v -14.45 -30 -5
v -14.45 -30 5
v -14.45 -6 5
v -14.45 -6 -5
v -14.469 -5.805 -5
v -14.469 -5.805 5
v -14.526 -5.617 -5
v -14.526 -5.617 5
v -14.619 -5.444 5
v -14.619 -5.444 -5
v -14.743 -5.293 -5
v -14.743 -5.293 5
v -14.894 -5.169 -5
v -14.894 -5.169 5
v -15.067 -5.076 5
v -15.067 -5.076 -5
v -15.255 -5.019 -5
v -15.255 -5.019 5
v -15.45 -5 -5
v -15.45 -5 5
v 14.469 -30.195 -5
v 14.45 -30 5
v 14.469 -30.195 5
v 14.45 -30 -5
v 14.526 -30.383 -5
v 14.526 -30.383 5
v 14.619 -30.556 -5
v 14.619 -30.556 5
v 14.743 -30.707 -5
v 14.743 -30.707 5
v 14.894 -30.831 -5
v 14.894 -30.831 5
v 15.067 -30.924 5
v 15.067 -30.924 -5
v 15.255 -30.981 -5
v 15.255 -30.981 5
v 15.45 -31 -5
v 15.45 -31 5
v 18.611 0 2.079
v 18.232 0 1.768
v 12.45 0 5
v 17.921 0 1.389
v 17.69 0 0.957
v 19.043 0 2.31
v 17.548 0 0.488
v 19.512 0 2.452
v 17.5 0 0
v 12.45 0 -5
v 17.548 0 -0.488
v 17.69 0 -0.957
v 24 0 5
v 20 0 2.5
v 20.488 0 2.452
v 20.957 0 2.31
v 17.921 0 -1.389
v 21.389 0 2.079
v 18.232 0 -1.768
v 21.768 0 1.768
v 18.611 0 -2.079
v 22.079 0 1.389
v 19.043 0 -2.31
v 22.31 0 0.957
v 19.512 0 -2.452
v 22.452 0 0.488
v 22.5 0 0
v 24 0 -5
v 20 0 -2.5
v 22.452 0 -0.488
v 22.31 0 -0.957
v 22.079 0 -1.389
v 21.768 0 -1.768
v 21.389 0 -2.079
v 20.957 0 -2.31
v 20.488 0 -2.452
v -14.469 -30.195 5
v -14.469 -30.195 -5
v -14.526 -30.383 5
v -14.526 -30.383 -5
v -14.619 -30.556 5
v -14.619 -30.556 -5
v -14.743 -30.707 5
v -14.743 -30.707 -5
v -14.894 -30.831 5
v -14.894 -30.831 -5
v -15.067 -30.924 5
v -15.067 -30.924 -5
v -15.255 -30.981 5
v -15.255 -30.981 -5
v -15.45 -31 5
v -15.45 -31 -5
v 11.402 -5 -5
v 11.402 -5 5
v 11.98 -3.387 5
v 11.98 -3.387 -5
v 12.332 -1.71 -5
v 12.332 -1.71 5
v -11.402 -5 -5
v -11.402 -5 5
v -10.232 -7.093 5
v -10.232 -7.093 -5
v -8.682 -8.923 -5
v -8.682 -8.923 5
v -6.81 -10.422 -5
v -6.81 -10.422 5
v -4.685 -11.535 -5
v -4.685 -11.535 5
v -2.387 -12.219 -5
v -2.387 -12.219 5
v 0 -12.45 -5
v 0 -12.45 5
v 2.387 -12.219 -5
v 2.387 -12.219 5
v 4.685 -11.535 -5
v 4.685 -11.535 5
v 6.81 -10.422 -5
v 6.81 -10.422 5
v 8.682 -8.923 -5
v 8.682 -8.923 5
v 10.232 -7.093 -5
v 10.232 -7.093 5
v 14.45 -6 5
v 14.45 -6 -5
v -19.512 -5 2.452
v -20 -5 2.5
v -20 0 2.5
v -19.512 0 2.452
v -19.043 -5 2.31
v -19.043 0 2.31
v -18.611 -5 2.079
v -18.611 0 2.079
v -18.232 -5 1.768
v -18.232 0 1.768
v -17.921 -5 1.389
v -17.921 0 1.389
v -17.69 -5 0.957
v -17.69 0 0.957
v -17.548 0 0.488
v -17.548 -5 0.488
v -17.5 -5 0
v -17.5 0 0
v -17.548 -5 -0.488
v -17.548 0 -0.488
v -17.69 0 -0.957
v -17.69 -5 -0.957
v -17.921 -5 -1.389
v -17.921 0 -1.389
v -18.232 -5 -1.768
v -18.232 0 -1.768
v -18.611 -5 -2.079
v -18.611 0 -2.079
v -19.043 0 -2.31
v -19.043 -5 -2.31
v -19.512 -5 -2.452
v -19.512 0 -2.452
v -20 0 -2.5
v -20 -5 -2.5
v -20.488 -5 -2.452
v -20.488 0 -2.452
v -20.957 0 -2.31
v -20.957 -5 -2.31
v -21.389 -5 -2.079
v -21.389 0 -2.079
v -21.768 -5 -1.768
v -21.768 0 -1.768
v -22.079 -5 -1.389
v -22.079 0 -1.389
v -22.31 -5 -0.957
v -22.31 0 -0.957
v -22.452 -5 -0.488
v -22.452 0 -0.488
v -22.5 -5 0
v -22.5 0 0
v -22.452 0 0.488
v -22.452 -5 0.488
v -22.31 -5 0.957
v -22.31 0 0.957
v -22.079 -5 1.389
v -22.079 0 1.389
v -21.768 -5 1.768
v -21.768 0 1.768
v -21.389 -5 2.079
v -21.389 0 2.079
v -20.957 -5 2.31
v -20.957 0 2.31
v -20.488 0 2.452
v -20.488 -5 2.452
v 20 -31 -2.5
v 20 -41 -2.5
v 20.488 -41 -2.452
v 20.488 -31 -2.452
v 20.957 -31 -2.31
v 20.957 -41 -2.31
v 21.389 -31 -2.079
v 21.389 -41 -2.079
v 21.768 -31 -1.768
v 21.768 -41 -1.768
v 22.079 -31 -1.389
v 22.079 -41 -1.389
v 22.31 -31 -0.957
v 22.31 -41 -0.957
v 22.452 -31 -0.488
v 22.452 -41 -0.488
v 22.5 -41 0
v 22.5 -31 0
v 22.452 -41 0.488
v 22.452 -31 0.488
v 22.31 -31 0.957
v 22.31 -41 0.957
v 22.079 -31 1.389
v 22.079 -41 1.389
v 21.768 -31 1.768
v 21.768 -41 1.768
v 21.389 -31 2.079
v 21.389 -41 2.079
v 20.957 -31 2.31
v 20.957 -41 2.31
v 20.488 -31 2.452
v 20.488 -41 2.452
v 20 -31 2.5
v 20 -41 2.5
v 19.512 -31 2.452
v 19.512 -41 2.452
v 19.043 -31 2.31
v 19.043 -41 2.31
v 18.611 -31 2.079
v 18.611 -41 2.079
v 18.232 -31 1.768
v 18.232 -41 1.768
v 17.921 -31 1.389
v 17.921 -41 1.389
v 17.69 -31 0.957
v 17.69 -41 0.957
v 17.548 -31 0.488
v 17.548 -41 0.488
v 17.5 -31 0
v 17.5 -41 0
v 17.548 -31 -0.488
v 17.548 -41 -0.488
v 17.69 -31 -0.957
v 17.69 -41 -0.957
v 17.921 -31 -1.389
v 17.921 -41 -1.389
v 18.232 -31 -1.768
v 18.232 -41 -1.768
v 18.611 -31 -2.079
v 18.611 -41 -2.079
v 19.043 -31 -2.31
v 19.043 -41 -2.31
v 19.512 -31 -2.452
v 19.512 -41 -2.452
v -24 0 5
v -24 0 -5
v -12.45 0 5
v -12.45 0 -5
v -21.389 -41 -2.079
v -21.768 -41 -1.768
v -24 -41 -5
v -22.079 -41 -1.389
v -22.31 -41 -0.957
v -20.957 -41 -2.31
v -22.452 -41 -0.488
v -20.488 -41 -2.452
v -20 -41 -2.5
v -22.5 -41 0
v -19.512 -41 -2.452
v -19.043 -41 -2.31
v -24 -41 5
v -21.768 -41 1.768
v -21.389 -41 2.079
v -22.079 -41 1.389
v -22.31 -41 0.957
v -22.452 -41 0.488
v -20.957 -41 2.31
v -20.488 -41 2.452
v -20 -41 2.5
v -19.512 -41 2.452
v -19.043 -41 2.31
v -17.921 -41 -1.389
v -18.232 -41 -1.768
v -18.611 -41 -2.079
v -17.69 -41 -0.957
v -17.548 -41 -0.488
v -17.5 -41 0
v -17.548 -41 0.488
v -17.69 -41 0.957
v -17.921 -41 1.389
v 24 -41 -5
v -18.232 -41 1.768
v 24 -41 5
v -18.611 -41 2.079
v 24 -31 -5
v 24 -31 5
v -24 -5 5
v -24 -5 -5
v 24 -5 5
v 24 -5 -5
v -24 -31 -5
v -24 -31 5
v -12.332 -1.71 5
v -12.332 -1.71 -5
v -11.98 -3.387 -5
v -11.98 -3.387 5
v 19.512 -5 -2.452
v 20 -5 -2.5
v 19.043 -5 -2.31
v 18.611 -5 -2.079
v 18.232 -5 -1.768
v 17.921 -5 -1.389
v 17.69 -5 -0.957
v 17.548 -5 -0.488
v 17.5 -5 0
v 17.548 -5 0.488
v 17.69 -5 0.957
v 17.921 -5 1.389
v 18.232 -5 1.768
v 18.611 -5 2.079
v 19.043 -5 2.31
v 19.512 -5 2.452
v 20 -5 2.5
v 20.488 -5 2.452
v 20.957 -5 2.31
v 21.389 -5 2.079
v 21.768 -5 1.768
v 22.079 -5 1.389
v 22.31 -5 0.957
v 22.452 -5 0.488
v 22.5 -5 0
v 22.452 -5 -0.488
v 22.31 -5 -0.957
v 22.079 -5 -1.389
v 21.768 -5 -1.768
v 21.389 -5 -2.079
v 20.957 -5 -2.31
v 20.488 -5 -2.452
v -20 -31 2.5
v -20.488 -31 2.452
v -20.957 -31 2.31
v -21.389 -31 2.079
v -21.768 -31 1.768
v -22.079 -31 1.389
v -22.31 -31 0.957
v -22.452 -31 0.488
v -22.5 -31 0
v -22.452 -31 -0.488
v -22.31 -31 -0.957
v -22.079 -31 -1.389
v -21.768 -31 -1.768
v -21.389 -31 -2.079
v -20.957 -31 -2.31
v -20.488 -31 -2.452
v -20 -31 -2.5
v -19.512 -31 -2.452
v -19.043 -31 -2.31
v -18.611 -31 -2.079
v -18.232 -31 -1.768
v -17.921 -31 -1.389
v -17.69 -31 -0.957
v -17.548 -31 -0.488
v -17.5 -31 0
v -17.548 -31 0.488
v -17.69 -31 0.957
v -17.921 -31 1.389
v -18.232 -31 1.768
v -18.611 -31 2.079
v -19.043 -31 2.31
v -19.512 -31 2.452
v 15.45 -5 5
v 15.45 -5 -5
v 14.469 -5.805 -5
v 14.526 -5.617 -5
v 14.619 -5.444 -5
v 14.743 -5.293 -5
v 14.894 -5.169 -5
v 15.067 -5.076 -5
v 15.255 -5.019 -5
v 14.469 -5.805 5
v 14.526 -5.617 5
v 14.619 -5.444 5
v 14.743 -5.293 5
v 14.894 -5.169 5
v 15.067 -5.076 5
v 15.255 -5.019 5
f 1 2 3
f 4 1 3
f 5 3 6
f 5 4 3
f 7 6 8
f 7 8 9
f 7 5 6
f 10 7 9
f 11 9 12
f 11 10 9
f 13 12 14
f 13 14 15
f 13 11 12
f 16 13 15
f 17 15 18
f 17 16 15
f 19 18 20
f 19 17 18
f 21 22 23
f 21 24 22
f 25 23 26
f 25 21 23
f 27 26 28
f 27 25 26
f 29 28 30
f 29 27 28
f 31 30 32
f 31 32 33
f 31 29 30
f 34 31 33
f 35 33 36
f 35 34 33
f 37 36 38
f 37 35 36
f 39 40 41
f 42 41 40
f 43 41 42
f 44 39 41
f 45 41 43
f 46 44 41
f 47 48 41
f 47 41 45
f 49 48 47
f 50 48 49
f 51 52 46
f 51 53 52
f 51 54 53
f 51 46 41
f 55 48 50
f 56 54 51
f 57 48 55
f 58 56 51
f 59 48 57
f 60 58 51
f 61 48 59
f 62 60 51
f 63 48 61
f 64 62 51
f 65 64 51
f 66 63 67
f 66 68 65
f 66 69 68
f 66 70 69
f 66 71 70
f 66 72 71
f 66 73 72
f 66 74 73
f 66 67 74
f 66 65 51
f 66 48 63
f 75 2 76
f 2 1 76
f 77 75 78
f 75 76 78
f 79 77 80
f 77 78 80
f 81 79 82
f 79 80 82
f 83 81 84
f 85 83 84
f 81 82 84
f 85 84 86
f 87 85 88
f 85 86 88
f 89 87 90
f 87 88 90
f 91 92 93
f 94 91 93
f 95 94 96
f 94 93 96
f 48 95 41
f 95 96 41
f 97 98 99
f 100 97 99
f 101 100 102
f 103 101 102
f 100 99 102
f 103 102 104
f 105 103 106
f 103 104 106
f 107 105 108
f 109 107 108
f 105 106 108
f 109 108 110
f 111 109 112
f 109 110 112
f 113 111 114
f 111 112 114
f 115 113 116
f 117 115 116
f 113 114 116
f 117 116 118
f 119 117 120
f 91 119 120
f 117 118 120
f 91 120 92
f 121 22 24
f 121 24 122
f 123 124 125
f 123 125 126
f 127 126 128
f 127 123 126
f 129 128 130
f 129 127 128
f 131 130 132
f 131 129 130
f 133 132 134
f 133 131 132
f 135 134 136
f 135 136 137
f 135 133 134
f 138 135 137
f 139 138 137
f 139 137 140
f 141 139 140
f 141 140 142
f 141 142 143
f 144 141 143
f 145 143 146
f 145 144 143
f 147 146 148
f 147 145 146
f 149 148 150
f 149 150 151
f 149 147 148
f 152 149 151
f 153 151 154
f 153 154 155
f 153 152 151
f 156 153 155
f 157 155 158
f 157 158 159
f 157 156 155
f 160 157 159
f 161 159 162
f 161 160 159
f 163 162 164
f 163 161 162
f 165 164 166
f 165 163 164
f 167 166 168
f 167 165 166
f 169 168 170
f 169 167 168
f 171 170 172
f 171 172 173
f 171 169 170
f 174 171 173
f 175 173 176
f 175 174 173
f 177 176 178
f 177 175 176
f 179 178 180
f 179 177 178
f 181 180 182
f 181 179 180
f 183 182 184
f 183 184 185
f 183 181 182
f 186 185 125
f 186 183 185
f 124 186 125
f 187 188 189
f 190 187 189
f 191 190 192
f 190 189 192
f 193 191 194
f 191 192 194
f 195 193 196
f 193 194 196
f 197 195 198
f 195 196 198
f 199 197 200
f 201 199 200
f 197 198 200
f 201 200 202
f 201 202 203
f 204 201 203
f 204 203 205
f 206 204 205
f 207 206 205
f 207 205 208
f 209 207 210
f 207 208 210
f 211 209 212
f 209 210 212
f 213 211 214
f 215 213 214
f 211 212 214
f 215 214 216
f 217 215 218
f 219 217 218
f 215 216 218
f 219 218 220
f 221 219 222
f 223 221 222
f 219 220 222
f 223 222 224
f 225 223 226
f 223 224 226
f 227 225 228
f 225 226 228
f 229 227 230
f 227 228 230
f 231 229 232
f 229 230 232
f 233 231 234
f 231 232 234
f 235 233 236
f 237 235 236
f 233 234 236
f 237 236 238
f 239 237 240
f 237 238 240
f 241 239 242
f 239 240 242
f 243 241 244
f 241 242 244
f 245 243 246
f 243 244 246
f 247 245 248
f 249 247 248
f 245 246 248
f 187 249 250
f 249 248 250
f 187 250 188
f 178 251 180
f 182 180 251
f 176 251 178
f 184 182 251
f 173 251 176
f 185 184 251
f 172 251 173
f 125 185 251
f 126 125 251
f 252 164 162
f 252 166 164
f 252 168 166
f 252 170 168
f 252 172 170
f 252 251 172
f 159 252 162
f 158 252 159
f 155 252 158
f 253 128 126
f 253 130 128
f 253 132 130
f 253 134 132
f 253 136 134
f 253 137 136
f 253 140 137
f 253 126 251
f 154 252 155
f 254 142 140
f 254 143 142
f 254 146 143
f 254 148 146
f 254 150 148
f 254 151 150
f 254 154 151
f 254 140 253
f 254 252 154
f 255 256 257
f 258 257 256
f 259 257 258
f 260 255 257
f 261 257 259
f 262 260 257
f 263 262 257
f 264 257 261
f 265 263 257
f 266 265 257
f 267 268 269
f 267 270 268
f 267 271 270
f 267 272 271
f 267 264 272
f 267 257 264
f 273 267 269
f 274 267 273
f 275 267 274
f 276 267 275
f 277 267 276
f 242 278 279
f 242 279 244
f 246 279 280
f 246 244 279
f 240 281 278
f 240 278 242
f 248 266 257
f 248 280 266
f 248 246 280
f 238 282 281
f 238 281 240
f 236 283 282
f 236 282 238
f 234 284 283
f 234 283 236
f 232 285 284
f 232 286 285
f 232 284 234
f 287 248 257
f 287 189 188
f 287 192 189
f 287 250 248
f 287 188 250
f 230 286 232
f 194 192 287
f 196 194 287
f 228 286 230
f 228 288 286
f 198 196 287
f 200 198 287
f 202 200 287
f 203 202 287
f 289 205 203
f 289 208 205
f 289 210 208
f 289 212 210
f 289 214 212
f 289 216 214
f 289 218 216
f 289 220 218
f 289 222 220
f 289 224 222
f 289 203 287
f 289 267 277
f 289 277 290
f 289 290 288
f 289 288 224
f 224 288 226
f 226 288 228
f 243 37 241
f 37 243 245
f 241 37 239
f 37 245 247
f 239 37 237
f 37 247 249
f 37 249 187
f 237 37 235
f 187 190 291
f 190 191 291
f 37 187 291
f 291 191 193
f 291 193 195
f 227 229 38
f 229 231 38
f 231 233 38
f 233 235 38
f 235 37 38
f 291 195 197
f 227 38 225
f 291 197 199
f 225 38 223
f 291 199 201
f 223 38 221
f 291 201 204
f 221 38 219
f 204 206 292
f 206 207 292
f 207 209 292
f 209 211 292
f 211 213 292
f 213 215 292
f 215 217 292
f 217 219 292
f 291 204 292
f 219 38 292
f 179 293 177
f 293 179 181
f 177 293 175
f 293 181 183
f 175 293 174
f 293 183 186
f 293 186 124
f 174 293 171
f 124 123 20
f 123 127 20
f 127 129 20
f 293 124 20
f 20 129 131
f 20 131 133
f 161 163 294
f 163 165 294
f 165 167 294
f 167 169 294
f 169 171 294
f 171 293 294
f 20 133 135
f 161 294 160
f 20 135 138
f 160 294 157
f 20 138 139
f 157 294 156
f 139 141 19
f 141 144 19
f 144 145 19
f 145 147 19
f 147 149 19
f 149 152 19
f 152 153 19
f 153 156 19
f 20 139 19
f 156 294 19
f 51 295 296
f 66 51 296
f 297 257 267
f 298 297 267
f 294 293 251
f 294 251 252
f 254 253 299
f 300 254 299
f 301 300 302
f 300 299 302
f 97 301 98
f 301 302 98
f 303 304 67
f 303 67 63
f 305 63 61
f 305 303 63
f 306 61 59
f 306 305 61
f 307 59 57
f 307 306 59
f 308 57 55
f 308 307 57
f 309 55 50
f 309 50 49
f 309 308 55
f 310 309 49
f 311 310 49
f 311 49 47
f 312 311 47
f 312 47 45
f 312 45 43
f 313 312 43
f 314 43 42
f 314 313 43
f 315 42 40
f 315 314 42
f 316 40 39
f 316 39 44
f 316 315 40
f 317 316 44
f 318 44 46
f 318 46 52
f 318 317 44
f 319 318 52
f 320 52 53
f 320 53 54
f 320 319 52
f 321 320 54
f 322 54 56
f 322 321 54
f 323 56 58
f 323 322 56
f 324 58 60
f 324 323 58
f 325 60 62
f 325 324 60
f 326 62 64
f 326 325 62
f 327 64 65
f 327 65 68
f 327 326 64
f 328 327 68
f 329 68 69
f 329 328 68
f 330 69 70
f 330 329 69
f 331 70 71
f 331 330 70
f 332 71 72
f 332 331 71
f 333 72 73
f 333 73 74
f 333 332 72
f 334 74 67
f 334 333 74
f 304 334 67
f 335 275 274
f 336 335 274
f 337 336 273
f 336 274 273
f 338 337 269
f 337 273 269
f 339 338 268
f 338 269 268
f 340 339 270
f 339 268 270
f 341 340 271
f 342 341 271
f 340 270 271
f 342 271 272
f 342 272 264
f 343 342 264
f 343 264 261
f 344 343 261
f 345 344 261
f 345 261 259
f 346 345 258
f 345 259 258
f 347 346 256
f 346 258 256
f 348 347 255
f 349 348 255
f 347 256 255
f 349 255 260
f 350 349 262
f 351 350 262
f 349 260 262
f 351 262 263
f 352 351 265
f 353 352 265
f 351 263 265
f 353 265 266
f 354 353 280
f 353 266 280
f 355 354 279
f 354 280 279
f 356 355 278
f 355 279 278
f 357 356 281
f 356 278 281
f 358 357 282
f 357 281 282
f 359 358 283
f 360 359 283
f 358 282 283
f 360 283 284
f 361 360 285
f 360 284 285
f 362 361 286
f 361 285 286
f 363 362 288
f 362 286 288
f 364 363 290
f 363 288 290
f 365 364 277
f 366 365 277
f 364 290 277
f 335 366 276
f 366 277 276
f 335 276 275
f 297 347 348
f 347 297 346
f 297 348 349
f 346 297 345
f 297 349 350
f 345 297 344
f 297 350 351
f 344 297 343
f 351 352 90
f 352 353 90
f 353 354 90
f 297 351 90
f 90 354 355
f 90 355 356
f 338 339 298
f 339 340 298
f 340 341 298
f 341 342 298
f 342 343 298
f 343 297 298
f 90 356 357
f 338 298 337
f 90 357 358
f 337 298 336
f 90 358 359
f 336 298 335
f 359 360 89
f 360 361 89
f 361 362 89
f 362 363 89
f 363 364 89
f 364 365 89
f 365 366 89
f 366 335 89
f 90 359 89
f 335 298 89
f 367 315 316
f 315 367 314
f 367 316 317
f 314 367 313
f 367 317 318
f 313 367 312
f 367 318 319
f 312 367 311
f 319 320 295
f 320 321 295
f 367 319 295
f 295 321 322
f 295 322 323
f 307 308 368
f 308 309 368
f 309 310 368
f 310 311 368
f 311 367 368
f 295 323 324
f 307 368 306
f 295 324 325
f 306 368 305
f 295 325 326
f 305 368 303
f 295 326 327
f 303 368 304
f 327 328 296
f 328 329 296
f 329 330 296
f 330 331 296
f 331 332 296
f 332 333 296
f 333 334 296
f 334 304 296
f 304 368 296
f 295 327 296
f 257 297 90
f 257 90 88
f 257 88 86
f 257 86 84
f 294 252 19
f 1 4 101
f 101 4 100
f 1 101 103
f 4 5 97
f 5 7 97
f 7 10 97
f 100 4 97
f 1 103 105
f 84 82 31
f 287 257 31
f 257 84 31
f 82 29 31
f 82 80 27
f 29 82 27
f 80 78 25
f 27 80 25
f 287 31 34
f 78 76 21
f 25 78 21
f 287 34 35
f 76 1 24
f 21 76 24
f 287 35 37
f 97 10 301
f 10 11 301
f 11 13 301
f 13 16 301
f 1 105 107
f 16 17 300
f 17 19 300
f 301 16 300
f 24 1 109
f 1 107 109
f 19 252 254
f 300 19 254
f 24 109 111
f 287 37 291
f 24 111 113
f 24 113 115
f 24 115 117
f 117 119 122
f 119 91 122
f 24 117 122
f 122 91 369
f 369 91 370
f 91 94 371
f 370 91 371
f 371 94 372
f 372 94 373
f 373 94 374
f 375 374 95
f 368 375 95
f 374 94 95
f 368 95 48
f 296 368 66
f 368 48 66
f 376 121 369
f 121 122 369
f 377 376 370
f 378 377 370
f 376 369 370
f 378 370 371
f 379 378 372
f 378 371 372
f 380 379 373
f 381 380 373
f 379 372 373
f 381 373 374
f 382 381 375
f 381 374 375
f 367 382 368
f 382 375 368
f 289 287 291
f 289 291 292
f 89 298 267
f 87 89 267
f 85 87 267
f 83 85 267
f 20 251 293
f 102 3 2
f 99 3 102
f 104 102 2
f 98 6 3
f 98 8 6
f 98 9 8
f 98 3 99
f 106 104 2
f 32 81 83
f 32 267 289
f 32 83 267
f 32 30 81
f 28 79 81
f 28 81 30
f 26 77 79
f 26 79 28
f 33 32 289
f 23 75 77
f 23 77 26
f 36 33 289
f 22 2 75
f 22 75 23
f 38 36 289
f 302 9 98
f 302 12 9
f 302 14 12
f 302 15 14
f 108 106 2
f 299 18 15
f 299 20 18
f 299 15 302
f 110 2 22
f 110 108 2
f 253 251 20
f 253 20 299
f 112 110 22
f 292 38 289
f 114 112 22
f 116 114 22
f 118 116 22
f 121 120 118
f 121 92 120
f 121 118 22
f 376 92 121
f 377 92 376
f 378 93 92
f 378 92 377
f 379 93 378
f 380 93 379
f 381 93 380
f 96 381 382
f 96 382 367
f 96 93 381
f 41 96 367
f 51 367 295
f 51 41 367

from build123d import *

# Parameters (mm, degrees)
EXTRUDE_1_DEPTH     = 5
SKETCH_3_W          = 48
SKETCH_3_H          = 10
SKETCH_3_R          = 2.5
EXTRUDE_2_DEPTH     = 10
EXTRUDE_START       = -5
SKETCH_4_W          = 48
SKETCH_4_H          = 10
SKETCH_4_R          = 2.5
EXTRUDE_3_DEPTH     = 5
SKETCH_5_W          = 2
SKETCH_5_H          = 26
EXTRUDE_4_DEPTH     = 10
SKETCH_6_R          = 12.45
CUT_EXTRUDE_1_DEPTH = 16
FILLET_2_R          = 1
FILLET_3_R          = 1


with BuildPart() as part:
    # 草图1 → 凸台-拉伸1 (new, symmetric)
    with BuildSketch(Plane.XY):
        with BuildLine():
            Line((12.45, 0), (12.45, -41))
            Line((12.45, -41), (-12.45, -41))
            Line((-12.45, -41), (-12.45, 0))
            ThreePointArc((-12.45, 0), (0, -12.45), (12.45, 0))
        make_face()
    extrude(amount=EXTRUDE_1_DEPTH, both=True)

    # 草图3 → 凸台-拉伸2 (add)
    with BuildSketch(Plane.XZ.offset(41)):
        Rectangle(SKETCH_3_W, SKETCH_3_H)
        with Locations(Location((20, 0, 0), (0, 0, 270))):
            Circle(SKETCH_3_R, mode=Mode.SUBTRACT)
        with Locations(Location((-20, 0, 0), (0, 0, 90))):
            Circle(SKETCH_3_R, mode=Mode.SUBTRACT)
    extrude(amount=-EXTRUDE_2_DEPTH)

    # 草图4 → 凸台-拉伸3 (add)
    with BuildSketch(Plane(origin=(0, 0, 0), x_dir=(1, 0, 0), z_dir=(0, 1, 0)).offset(EXTRUDE_START)):
        Rectangle(SKETCH_4_W, SKETCH_4_H)
        with Locations(Location((-20, 0, 0), (0, 0, 270))):
            Circle(SKETCH_4_R, mode=Mode.SUBTRACT)
        with Locations(Location((20, 0, 0), (0, 0, 90))):
            Circle(SKETCH_4_R, mode=Mode.SUBTRACT)
    extrude(amount=EXTRUDE_3_DEPTH)

    # 草图5 → 凸台-拉伸4 (add)
    with BuildSketch(Plane.XY.offset(5)):
        with Locations((-13.45, -18)):
            Rectangle(SKETCH_5_W, SKETCH_5_H)
        with Locations((13.45, -18)):
            Rectangle(SKETCH_5_W, SKETCH_5_H)
    extrude(amount=-EXTRUDE_4_DEPTH)

    # 草图6 → 切除-拉伸1 (cut)
    with BuildSketch(Plane.XY.offset(5)):
        Circle(SKETCH_6_R)
    extrude(amount=-CUT_EXTRUDE_1_DEPTH, mode=Mode.SUBTRACT)

    # 圆角2
    fillet_2_edges = [part.edges().sort_by_distance(p)[0] for p in [
        (-14.45, -31, 0),
        (14.45, -31, 0),
    ]]
    fillet(fillet_2_edges, radius=FILLET_2_R)

    # 圆角3
    fillet_3_edges = [part.edges().sort_by_distance(p)[0] for p in [
        (-14.45, -5, 0),
        (14.45, -5, 0),
    ]]
    fillet(fillet_3_edges, radius=FILLET_3_R)


solid = part.part
